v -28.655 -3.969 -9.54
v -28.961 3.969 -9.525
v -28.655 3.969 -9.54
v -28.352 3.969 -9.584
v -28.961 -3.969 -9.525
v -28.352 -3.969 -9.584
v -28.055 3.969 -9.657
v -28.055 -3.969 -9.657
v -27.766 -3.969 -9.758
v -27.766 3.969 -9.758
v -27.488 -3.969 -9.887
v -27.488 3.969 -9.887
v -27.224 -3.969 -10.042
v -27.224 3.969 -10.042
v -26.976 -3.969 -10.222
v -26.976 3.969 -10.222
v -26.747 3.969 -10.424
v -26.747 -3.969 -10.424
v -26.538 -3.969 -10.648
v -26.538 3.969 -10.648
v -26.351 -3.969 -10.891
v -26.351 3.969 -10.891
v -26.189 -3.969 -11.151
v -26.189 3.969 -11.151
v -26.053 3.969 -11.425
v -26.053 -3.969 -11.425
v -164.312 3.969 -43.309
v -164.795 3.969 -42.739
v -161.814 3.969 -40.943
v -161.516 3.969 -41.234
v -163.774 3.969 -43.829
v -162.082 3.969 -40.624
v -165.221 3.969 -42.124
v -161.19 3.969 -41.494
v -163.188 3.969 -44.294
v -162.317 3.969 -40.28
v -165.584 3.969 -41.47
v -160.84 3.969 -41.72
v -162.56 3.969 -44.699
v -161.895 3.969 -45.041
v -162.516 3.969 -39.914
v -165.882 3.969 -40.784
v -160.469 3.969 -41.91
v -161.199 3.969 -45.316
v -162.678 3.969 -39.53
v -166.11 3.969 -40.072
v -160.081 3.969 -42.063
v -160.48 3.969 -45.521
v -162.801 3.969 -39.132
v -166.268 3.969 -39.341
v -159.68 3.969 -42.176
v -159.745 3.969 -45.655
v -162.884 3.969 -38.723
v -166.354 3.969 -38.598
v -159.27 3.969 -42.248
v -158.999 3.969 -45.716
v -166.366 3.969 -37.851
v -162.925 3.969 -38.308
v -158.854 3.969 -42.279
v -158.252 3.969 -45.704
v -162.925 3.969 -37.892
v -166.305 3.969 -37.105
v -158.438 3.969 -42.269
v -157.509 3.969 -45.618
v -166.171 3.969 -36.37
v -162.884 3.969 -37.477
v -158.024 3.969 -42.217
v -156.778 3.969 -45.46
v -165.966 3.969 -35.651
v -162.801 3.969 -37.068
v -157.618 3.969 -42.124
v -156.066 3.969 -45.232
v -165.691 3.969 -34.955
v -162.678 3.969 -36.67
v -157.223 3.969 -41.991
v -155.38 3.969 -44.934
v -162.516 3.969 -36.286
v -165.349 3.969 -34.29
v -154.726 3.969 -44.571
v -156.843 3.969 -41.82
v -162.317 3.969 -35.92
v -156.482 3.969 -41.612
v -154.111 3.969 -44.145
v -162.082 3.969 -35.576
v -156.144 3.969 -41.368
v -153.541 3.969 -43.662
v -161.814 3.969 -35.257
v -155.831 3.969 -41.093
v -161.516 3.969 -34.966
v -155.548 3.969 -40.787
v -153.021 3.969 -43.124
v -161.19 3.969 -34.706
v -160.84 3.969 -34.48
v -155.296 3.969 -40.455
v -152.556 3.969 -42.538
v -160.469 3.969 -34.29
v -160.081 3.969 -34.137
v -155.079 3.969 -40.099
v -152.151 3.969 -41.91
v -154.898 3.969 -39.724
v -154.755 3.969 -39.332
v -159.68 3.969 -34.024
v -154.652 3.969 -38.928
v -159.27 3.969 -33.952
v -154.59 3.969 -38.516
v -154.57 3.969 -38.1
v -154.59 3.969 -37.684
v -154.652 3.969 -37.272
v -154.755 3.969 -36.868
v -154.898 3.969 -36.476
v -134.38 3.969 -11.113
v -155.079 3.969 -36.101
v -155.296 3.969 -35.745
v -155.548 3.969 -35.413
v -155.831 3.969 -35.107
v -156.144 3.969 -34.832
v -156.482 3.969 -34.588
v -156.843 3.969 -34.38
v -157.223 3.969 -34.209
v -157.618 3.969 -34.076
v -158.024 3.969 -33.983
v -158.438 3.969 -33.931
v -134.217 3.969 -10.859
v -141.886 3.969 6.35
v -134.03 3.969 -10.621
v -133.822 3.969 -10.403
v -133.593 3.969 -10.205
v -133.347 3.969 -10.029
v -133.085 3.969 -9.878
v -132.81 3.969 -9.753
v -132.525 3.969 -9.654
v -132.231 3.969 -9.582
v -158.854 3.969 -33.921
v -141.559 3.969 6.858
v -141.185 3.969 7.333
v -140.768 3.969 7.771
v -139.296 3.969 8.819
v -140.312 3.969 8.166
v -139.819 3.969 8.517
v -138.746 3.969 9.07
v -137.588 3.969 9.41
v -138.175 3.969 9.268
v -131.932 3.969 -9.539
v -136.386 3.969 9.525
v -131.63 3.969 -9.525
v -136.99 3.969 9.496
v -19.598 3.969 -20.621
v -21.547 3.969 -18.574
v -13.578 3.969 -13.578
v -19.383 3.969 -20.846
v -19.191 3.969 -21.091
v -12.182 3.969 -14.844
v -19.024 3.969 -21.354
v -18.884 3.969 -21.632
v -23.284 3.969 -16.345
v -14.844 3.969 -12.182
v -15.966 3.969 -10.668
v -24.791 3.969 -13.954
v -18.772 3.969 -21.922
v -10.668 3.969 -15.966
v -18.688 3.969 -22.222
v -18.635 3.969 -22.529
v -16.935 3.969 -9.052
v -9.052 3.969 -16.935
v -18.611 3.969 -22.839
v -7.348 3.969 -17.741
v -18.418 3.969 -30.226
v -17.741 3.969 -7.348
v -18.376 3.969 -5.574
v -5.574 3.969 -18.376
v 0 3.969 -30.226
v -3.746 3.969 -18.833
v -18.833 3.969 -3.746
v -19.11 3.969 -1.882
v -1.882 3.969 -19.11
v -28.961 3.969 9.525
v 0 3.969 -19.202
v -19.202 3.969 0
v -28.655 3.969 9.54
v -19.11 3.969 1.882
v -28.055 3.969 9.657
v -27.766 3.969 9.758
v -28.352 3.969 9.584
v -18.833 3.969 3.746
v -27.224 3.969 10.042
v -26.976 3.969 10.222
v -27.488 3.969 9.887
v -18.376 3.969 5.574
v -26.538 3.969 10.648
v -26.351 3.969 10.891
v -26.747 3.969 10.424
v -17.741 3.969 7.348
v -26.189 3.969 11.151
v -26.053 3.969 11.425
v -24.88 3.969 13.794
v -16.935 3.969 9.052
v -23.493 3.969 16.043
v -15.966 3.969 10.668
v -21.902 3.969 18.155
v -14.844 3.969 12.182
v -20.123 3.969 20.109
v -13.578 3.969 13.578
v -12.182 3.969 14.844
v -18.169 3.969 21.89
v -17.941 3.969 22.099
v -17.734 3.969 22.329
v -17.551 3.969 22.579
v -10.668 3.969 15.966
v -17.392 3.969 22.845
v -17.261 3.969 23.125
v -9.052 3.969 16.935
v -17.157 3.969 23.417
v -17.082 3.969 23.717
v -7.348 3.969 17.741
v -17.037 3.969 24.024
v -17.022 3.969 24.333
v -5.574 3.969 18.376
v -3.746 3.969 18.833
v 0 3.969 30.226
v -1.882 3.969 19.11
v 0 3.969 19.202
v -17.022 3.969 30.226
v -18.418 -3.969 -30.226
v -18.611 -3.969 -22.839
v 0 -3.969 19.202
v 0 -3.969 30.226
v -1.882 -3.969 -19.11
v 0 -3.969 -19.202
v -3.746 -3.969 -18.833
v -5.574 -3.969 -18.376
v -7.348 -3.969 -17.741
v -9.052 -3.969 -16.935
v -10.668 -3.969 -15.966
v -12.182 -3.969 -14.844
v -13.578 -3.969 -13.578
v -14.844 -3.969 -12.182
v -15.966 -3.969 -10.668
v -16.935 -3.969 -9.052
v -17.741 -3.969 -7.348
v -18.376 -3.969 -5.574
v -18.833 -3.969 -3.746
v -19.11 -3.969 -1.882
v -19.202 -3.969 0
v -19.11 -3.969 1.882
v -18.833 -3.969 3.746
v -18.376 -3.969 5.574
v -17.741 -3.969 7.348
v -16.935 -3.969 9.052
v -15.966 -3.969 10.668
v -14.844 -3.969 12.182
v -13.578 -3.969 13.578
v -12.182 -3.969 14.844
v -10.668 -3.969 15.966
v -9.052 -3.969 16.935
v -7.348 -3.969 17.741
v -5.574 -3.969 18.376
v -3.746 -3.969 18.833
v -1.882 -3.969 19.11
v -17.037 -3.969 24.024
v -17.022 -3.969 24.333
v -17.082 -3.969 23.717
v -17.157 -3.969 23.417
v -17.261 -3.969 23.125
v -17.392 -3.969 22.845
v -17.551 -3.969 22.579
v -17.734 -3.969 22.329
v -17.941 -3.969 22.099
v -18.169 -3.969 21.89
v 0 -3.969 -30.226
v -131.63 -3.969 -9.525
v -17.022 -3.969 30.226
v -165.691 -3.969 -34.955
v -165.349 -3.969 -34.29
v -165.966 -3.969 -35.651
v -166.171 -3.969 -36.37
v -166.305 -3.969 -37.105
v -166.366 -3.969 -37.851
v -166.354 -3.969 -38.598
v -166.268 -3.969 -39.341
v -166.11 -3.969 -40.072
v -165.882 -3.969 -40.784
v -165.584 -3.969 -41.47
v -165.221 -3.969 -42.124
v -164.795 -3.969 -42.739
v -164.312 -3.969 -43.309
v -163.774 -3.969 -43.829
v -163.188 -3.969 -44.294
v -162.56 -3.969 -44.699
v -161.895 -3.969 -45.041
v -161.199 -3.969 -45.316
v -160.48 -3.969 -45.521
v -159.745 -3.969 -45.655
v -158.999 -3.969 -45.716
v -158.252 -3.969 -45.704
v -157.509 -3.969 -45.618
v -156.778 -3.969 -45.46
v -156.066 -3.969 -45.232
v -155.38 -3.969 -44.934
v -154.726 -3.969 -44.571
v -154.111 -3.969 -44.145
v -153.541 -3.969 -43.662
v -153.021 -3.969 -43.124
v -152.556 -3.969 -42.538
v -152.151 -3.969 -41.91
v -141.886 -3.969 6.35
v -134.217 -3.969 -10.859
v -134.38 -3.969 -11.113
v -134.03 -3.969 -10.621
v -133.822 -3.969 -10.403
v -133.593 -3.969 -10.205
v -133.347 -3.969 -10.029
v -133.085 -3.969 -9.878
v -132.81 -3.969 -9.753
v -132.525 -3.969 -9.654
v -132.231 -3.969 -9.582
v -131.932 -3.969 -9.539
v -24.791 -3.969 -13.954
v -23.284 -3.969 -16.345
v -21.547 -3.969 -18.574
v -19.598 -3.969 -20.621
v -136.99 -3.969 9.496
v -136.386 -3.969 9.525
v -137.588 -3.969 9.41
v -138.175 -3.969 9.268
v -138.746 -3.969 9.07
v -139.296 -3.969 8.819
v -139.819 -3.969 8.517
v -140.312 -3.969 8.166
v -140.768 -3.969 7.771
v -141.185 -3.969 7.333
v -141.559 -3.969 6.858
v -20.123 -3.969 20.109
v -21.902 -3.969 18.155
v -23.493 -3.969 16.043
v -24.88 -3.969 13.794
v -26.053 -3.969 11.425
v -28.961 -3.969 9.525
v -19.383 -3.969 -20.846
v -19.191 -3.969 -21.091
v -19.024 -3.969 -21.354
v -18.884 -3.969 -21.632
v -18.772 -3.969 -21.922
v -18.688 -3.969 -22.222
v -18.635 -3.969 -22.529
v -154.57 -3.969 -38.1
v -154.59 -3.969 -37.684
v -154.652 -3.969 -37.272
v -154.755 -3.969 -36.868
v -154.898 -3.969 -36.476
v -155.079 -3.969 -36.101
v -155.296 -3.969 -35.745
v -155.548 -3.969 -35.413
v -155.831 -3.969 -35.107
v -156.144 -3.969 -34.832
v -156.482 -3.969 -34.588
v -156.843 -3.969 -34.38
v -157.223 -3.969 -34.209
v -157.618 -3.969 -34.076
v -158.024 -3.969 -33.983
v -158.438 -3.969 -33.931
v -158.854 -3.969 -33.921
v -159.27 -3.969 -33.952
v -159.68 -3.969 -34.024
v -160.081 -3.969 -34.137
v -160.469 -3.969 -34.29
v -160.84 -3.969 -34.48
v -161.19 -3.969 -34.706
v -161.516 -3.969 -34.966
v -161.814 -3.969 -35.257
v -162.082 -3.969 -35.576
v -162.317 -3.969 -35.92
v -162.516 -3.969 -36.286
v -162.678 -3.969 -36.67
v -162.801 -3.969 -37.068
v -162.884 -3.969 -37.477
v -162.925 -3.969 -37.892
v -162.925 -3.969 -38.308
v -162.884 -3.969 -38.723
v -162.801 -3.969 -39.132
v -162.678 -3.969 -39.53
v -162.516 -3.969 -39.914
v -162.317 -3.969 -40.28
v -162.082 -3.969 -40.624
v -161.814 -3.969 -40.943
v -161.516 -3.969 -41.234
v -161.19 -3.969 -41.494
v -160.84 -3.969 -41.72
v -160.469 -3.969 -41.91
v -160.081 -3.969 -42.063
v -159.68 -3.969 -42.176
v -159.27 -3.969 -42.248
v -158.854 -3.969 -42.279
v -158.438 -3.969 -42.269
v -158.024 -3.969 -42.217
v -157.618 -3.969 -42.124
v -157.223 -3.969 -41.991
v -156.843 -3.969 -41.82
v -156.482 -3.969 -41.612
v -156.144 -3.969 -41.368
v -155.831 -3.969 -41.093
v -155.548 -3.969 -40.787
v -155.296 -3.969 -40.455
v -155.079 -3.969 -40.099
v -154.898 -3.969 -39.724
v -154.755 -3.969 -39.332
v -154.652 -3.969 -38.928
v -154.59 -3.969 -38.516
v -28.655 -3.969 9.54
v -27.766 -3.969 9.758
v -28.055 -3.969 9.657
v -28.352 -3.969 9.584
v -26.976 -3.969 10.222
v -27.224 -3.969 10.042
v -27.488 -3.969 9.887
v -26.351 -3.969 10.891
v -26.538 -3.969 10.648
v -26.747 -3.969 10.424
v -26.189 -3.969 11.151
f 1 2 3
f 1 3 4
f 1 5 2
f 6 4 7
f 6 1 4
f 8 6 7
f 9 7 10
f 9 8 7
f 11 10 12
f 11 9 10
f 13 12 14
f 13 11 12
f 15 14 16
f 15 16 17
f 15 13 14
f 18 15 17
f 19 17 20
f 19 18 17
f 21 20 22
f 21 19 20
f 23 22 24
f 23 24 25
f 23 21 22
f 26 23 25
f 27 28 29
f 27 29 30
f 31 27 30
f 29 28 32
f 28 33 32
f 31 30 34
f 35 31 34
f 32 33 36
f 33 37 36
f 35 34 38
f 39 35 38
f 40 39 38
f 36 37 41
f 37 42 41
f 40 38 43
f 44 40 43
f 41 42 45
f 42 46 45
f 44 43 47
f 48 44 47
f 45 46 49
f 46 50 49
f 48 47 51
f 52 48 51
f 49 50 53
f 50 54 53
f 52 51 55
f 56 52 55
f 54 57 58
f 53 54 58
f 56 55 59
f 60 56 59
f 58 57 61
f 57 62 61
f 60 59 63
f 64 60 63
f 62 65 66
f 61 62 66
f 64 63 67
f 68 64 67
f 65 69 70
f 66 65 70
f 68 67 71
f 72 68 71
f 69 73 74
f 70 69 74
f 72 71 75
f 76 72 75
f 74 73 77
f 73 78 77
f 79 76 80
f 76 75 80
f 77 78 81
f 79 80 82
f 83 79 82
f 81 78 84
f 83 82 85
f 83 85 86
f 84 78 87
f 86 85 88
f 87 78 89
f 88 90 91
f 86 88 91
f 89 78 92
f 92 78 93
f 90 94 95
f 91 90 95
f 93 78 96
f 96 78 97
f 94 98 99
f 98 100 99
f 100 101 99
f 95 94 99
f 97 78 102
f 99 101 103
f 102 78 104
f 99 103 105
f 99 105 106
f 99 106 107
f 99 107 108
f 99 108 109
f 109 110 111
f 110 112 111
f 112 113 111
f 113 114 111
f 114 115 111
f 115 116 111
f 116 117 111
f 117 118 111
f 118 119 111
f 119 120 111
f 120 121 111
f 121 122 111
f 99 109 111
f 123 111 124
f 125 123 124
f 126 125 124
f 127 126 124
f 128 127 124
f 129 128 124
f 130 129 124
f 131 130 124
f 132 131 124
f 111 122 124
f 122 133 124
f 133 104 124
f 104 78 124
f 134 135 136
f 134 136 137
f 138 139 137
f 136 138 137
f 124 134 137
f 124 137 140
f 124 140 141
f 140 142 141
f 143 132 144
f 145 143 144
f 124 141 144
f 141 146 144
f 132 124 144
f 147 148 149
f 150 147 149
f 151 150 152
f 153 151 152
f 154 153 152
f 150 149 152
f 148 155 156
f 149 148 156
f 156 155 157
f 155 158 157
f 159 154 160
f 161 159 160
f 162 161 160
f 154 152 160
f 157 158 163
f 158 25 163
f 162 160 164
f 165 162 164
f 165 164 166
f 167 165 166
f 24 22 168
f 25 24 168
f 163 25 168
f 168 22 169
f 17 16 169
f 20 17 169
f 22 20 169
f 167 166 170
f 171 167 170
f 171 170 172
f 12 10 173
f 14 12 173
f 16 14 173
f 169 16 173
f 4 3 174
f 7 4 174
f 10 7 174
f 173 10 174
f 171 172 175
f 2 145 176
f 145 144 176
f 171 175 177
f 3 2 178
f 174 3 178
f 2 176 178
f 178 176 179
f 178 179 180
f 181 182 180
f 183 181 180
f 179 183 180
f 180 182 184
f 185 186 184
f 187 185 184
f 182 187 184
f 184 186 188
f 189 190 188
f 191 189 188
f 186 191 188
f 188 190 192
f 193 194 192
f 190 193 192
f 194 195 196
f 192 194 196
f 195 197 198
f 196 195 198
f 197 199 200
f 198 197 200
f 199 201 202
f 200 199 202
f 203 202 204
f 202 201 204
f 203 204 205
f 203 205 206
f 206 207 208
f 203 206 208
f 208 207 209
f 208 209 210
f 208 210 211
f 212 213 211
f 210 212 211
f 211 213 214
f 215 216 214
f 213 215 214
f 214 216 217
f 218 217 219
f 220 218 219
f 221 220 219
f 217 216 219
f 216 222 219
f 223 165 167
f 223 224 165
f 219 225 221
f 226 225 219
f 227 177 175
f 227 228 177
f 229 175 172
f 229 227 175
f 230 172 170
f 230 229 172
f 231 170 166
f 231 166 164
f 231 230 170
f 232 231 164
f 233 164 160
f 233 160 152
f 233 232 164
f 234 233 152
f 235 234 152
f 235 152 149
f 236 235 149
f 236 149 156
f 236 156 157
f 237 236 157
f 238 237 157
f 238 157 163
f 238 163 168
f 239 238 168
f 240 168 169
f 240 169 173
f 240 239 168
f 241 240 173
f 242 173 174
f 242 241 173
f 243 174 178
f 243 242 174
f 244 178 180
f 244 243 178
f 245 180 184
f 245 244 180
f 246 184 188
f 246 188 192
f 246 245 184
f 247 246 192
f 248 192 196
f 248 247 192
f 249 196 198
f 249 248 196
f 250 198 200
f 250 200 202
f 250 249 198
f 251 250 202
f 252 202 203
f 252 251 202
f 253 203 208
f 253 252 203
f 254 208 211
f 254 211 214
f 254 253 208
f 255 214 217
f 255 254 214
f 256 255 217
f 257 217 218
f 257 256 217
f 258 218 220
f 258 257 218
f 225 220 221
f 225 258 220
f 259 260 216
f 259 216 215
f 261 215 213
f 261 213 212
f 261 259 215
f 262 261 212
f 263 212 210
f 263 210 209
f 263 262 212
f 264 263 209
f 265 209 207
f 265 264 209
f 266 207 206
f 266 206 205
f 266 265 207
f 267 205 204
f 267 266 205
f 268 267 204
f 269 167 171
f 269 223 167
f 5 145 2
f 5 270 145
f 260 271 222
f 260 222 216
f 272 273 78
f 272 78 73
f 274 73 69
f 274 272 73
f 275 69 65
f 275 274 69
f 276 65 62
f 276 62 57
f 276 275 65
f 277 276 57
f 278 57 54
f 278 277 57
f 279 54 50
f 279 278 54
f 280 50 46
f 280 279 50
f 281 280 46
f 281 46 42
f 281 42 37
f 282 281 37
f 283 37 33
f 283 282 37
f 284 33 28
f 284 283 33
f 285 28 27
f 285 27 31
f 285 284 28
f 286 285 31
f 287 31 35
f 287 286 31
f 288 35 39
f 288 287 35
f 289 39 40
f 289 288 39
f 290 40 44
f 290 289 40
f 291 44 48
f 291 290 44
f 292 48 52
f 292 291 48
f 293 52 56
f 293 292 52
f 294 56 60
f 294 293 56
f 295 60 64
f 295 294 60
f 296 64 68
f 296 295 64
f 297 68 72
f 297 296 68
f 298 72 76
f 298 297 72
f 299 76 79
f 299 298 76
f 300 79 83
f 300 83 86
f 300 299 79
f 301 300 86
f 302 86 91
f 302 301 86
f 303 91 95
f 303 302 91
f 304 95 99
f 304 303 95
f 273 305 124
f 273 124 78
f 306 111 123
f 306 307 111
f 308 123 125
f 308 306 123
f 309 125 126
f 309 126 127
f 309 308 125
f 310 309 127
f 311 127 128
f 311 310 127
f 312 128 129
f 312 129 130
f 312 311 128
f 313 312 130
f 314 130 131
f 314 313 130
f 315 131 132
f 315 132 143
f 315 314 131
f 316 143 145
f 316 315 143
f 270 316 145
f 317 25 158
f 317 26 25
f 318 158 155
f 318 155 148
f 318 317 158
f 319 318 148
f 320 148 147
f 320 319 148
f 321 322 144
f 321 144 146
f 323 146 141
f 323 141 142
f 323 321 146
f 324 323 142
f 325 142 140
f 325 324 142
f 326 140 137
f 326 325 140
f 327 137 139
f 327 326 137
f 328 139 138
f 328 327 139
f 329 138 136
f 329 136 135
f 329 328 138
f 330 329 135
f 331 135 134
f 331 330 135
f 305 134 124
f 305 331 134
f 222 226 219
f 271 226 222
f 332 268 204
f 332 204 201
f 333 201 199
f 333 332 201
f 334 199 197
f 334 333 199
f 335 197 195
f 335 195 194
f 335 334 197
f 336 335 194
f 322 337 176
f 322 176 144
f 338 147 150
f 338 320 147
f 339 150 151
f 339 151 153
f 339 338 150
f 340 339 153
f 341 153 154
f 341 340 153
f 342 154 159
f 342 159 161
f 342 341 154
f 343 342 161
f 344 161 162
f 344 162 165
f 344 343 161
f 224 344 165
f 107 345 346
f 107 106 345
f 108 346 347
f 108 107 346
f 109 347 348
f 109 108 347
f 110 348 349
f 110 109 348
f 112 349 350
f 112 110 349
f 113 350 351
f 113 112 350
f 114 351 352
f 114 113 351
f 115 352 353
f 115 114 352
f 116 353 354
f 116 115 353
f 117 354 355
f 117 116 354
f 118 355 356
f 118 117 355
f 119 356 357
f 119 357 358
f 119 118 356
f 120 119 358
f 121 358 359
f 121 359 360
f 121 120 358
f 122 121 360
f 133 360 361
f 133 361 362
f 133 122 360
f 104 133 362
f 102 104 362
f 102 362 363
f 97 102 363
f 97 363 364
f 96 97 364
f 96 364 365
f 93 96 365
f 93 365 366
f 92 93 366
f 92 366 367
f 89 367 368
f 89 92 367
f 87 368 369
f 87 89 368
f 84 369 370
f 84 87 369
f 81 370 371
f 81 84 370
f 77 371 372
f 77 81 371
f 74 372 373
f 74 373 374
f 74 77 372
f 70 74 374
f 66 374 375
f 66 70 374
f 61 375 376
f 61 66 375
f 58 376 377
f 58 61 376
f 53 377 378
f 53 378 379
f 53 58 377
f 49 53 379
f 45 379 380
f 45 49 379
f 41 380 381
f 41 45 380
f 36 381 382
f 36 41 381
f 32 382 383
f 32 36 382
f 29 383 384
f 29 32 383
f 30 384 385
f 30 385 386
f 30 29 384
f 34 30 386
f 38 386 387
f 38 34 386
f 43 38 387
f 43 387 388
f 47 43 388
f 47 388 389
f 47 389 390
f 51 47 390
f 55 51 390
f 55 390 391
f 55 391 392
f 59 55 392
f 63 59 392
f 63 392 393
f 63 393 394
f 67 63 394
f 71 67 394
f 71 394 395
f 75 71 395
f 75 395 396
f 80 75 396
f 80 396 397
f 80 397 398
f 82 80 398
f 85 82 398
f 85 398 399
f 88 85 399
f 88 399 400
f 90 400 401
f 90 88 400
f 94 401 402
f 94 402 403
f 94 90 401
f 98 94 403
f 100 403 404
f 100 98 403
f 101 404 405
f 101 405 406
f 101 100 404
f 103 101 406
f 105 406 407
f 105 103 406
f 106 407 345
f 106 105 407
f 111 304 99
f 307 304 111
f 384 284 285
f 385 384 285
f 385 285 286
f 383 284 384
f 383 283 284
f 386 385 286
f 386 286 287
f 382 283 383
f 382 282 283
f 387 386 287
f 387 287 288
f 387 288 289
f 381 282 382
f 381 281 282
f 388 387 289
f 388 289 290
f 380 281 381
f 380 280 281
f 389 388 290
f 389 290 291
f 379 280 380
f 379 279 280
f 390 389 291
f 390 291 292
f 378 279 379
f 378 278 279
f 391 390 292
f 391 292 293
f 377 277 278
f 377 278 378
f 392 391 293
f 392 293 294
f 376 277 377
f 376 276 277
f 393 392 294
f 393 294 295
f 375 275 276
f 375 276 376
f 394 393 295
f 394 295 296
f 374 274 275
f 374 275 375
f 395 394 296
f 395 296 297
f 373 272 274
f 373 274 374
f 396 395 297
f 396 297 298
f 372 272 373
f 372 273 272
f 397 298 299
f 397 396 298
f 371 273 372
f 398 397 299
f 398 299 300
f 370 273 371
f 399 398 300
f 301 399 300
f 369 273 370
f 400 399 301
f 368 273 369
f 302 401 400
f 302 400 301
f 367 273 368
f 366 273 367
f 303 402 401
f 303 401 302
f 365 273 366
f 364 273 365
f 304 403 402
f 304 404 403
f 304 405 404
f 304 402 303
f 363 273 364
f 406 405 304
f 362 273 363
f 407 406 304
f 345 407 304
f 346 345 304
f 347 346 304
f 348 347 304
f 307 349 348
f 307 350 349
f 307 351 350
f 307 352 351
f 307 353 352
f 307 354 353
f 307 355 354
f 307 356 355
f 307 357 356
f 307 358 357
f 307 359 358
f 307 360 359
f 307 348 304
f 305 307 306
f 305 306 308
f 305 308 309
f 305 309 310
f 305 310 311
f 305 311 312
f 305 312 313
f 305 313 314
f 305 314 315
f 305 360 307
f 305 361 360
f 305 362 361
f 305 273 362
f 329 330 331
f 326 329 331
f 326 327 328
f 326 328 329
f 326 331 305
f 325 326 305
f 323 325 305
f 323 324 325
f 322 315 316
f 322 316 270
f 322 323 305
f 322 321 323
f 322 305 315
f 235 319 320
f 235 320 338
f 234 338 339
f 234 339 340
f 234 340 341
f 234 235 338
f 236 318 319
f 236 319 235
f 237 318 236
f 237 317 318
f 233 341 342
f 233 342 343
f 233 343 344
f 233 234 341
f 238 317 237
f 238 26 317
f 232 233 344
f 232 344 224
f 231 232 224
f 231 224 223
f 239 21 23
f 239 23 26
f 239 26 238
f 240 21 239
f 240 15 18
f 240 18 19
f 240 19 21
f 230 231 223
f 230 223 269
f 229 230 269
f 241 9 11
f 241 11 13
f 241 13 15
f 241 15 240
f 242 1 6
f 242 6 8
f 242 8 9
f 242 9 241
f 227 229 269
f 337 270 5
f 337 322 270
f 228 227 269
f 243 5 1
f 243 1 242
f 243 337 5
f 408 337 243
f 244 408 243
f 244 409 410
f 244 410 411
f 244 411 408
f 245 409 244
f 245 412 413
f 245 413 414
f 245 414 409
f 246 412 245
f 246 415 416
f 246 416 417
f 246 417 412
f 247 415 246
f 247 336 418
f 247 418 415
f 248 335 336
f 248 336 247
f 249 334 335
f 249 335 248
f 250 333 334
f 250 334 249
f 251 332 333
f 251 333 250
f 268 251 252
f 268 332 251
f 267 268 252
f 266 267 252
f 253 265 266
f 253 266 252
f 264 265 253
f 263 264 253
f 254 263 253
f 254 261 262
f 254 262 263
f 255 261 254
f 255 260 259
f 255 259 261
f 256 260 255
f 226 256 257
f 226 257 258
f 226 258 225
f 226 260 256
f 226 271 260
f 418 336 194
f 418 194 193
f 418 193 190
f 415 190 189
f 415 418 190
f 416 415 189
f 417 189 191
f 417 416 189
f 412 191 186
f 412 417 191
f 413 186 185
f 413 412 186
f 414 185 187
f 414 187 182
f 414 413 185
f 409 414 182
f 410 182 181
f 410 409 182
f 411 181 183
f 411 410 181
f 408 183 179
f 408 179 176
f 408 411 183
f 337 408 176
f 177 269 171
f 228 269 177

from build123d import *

# Parameters (mm, degrees)
F0_R     = 4.180396
F1_DEPTH = 3.96875


with BuildPart() as f1:
    # F0 (on Front) → F1 (new body, symmetric)
    with BuildSketch(Plane.XZ):
        with BuildLine():
            ThreePointArc((0, -19.2024), (-19.2024, 0), (0, 19.2024))
            Line((0, 19.2024), (0, 30.226))
            Line((0, 30.226), (-17.022172, 30.226))
            Line((-17.022172, 30.226), (-17.022172, 24.332866))
            ThreePointArc((-17.022172, 24.332866), (-17.323239, 22.983372), (-18.169343, 21.889808))
            ThreePointArc((-18.169343, 21.889808), (-22.721865, 17.117405), (-26.05303, 11.4249))
            ThreePointArc((-26.05303, 11.4249), (-27.224045, 10.042081), (-28.960734, 9.525))
            Line((-28.960734, 9.525), (-136.386337, 9.525))
            ThreePointArc((-136.386337, 9.525), (-139.561337, 8.674261), (-141.885599, 6.35))
            Line((-141.885599, 6.35), (-165.349114, -34.29))
            ThreePointArc((-165.349114, -34.29), (-162.56, -44.699114), (-152.150886, -41.91))
            Line((-152.150886, -41.91), (-134.380152, -11.113158))
            ThreePointArc((-134.380152, -11.113158), (-133.217971, -9.950559), (-131.630142, -9.525))
            Line((-131.630142, -9.525), (-28.960734, -9.525))
            ThreePointArc((-28.960734, -9.525), (-27.224045, -10.042081), (-26.05303, -11.4249))
            ThreePointArc((-26.05303, -11.4249), (-23.2839, -16.344684), (-19.597776, -20.620763))
            ThreePointArc((-19.597776, -20.620763), (-18.884031, -21.631899), (-18.611115, -22.839104))
            Line((-18.611115, -22.839104), (-18.417747, -30.226))
            Line((-18.417747, -30.226), (0, -30.226))
            Line((0, -30.226), (0, -19.2024))
        make_face()
        with Locations((-158.75, -38.1)):
            Circle(F0_R, mode=Mode.SUBTRACT)
    extrude(amount=F1_DEPTH, both=True)


solid = f1.part
